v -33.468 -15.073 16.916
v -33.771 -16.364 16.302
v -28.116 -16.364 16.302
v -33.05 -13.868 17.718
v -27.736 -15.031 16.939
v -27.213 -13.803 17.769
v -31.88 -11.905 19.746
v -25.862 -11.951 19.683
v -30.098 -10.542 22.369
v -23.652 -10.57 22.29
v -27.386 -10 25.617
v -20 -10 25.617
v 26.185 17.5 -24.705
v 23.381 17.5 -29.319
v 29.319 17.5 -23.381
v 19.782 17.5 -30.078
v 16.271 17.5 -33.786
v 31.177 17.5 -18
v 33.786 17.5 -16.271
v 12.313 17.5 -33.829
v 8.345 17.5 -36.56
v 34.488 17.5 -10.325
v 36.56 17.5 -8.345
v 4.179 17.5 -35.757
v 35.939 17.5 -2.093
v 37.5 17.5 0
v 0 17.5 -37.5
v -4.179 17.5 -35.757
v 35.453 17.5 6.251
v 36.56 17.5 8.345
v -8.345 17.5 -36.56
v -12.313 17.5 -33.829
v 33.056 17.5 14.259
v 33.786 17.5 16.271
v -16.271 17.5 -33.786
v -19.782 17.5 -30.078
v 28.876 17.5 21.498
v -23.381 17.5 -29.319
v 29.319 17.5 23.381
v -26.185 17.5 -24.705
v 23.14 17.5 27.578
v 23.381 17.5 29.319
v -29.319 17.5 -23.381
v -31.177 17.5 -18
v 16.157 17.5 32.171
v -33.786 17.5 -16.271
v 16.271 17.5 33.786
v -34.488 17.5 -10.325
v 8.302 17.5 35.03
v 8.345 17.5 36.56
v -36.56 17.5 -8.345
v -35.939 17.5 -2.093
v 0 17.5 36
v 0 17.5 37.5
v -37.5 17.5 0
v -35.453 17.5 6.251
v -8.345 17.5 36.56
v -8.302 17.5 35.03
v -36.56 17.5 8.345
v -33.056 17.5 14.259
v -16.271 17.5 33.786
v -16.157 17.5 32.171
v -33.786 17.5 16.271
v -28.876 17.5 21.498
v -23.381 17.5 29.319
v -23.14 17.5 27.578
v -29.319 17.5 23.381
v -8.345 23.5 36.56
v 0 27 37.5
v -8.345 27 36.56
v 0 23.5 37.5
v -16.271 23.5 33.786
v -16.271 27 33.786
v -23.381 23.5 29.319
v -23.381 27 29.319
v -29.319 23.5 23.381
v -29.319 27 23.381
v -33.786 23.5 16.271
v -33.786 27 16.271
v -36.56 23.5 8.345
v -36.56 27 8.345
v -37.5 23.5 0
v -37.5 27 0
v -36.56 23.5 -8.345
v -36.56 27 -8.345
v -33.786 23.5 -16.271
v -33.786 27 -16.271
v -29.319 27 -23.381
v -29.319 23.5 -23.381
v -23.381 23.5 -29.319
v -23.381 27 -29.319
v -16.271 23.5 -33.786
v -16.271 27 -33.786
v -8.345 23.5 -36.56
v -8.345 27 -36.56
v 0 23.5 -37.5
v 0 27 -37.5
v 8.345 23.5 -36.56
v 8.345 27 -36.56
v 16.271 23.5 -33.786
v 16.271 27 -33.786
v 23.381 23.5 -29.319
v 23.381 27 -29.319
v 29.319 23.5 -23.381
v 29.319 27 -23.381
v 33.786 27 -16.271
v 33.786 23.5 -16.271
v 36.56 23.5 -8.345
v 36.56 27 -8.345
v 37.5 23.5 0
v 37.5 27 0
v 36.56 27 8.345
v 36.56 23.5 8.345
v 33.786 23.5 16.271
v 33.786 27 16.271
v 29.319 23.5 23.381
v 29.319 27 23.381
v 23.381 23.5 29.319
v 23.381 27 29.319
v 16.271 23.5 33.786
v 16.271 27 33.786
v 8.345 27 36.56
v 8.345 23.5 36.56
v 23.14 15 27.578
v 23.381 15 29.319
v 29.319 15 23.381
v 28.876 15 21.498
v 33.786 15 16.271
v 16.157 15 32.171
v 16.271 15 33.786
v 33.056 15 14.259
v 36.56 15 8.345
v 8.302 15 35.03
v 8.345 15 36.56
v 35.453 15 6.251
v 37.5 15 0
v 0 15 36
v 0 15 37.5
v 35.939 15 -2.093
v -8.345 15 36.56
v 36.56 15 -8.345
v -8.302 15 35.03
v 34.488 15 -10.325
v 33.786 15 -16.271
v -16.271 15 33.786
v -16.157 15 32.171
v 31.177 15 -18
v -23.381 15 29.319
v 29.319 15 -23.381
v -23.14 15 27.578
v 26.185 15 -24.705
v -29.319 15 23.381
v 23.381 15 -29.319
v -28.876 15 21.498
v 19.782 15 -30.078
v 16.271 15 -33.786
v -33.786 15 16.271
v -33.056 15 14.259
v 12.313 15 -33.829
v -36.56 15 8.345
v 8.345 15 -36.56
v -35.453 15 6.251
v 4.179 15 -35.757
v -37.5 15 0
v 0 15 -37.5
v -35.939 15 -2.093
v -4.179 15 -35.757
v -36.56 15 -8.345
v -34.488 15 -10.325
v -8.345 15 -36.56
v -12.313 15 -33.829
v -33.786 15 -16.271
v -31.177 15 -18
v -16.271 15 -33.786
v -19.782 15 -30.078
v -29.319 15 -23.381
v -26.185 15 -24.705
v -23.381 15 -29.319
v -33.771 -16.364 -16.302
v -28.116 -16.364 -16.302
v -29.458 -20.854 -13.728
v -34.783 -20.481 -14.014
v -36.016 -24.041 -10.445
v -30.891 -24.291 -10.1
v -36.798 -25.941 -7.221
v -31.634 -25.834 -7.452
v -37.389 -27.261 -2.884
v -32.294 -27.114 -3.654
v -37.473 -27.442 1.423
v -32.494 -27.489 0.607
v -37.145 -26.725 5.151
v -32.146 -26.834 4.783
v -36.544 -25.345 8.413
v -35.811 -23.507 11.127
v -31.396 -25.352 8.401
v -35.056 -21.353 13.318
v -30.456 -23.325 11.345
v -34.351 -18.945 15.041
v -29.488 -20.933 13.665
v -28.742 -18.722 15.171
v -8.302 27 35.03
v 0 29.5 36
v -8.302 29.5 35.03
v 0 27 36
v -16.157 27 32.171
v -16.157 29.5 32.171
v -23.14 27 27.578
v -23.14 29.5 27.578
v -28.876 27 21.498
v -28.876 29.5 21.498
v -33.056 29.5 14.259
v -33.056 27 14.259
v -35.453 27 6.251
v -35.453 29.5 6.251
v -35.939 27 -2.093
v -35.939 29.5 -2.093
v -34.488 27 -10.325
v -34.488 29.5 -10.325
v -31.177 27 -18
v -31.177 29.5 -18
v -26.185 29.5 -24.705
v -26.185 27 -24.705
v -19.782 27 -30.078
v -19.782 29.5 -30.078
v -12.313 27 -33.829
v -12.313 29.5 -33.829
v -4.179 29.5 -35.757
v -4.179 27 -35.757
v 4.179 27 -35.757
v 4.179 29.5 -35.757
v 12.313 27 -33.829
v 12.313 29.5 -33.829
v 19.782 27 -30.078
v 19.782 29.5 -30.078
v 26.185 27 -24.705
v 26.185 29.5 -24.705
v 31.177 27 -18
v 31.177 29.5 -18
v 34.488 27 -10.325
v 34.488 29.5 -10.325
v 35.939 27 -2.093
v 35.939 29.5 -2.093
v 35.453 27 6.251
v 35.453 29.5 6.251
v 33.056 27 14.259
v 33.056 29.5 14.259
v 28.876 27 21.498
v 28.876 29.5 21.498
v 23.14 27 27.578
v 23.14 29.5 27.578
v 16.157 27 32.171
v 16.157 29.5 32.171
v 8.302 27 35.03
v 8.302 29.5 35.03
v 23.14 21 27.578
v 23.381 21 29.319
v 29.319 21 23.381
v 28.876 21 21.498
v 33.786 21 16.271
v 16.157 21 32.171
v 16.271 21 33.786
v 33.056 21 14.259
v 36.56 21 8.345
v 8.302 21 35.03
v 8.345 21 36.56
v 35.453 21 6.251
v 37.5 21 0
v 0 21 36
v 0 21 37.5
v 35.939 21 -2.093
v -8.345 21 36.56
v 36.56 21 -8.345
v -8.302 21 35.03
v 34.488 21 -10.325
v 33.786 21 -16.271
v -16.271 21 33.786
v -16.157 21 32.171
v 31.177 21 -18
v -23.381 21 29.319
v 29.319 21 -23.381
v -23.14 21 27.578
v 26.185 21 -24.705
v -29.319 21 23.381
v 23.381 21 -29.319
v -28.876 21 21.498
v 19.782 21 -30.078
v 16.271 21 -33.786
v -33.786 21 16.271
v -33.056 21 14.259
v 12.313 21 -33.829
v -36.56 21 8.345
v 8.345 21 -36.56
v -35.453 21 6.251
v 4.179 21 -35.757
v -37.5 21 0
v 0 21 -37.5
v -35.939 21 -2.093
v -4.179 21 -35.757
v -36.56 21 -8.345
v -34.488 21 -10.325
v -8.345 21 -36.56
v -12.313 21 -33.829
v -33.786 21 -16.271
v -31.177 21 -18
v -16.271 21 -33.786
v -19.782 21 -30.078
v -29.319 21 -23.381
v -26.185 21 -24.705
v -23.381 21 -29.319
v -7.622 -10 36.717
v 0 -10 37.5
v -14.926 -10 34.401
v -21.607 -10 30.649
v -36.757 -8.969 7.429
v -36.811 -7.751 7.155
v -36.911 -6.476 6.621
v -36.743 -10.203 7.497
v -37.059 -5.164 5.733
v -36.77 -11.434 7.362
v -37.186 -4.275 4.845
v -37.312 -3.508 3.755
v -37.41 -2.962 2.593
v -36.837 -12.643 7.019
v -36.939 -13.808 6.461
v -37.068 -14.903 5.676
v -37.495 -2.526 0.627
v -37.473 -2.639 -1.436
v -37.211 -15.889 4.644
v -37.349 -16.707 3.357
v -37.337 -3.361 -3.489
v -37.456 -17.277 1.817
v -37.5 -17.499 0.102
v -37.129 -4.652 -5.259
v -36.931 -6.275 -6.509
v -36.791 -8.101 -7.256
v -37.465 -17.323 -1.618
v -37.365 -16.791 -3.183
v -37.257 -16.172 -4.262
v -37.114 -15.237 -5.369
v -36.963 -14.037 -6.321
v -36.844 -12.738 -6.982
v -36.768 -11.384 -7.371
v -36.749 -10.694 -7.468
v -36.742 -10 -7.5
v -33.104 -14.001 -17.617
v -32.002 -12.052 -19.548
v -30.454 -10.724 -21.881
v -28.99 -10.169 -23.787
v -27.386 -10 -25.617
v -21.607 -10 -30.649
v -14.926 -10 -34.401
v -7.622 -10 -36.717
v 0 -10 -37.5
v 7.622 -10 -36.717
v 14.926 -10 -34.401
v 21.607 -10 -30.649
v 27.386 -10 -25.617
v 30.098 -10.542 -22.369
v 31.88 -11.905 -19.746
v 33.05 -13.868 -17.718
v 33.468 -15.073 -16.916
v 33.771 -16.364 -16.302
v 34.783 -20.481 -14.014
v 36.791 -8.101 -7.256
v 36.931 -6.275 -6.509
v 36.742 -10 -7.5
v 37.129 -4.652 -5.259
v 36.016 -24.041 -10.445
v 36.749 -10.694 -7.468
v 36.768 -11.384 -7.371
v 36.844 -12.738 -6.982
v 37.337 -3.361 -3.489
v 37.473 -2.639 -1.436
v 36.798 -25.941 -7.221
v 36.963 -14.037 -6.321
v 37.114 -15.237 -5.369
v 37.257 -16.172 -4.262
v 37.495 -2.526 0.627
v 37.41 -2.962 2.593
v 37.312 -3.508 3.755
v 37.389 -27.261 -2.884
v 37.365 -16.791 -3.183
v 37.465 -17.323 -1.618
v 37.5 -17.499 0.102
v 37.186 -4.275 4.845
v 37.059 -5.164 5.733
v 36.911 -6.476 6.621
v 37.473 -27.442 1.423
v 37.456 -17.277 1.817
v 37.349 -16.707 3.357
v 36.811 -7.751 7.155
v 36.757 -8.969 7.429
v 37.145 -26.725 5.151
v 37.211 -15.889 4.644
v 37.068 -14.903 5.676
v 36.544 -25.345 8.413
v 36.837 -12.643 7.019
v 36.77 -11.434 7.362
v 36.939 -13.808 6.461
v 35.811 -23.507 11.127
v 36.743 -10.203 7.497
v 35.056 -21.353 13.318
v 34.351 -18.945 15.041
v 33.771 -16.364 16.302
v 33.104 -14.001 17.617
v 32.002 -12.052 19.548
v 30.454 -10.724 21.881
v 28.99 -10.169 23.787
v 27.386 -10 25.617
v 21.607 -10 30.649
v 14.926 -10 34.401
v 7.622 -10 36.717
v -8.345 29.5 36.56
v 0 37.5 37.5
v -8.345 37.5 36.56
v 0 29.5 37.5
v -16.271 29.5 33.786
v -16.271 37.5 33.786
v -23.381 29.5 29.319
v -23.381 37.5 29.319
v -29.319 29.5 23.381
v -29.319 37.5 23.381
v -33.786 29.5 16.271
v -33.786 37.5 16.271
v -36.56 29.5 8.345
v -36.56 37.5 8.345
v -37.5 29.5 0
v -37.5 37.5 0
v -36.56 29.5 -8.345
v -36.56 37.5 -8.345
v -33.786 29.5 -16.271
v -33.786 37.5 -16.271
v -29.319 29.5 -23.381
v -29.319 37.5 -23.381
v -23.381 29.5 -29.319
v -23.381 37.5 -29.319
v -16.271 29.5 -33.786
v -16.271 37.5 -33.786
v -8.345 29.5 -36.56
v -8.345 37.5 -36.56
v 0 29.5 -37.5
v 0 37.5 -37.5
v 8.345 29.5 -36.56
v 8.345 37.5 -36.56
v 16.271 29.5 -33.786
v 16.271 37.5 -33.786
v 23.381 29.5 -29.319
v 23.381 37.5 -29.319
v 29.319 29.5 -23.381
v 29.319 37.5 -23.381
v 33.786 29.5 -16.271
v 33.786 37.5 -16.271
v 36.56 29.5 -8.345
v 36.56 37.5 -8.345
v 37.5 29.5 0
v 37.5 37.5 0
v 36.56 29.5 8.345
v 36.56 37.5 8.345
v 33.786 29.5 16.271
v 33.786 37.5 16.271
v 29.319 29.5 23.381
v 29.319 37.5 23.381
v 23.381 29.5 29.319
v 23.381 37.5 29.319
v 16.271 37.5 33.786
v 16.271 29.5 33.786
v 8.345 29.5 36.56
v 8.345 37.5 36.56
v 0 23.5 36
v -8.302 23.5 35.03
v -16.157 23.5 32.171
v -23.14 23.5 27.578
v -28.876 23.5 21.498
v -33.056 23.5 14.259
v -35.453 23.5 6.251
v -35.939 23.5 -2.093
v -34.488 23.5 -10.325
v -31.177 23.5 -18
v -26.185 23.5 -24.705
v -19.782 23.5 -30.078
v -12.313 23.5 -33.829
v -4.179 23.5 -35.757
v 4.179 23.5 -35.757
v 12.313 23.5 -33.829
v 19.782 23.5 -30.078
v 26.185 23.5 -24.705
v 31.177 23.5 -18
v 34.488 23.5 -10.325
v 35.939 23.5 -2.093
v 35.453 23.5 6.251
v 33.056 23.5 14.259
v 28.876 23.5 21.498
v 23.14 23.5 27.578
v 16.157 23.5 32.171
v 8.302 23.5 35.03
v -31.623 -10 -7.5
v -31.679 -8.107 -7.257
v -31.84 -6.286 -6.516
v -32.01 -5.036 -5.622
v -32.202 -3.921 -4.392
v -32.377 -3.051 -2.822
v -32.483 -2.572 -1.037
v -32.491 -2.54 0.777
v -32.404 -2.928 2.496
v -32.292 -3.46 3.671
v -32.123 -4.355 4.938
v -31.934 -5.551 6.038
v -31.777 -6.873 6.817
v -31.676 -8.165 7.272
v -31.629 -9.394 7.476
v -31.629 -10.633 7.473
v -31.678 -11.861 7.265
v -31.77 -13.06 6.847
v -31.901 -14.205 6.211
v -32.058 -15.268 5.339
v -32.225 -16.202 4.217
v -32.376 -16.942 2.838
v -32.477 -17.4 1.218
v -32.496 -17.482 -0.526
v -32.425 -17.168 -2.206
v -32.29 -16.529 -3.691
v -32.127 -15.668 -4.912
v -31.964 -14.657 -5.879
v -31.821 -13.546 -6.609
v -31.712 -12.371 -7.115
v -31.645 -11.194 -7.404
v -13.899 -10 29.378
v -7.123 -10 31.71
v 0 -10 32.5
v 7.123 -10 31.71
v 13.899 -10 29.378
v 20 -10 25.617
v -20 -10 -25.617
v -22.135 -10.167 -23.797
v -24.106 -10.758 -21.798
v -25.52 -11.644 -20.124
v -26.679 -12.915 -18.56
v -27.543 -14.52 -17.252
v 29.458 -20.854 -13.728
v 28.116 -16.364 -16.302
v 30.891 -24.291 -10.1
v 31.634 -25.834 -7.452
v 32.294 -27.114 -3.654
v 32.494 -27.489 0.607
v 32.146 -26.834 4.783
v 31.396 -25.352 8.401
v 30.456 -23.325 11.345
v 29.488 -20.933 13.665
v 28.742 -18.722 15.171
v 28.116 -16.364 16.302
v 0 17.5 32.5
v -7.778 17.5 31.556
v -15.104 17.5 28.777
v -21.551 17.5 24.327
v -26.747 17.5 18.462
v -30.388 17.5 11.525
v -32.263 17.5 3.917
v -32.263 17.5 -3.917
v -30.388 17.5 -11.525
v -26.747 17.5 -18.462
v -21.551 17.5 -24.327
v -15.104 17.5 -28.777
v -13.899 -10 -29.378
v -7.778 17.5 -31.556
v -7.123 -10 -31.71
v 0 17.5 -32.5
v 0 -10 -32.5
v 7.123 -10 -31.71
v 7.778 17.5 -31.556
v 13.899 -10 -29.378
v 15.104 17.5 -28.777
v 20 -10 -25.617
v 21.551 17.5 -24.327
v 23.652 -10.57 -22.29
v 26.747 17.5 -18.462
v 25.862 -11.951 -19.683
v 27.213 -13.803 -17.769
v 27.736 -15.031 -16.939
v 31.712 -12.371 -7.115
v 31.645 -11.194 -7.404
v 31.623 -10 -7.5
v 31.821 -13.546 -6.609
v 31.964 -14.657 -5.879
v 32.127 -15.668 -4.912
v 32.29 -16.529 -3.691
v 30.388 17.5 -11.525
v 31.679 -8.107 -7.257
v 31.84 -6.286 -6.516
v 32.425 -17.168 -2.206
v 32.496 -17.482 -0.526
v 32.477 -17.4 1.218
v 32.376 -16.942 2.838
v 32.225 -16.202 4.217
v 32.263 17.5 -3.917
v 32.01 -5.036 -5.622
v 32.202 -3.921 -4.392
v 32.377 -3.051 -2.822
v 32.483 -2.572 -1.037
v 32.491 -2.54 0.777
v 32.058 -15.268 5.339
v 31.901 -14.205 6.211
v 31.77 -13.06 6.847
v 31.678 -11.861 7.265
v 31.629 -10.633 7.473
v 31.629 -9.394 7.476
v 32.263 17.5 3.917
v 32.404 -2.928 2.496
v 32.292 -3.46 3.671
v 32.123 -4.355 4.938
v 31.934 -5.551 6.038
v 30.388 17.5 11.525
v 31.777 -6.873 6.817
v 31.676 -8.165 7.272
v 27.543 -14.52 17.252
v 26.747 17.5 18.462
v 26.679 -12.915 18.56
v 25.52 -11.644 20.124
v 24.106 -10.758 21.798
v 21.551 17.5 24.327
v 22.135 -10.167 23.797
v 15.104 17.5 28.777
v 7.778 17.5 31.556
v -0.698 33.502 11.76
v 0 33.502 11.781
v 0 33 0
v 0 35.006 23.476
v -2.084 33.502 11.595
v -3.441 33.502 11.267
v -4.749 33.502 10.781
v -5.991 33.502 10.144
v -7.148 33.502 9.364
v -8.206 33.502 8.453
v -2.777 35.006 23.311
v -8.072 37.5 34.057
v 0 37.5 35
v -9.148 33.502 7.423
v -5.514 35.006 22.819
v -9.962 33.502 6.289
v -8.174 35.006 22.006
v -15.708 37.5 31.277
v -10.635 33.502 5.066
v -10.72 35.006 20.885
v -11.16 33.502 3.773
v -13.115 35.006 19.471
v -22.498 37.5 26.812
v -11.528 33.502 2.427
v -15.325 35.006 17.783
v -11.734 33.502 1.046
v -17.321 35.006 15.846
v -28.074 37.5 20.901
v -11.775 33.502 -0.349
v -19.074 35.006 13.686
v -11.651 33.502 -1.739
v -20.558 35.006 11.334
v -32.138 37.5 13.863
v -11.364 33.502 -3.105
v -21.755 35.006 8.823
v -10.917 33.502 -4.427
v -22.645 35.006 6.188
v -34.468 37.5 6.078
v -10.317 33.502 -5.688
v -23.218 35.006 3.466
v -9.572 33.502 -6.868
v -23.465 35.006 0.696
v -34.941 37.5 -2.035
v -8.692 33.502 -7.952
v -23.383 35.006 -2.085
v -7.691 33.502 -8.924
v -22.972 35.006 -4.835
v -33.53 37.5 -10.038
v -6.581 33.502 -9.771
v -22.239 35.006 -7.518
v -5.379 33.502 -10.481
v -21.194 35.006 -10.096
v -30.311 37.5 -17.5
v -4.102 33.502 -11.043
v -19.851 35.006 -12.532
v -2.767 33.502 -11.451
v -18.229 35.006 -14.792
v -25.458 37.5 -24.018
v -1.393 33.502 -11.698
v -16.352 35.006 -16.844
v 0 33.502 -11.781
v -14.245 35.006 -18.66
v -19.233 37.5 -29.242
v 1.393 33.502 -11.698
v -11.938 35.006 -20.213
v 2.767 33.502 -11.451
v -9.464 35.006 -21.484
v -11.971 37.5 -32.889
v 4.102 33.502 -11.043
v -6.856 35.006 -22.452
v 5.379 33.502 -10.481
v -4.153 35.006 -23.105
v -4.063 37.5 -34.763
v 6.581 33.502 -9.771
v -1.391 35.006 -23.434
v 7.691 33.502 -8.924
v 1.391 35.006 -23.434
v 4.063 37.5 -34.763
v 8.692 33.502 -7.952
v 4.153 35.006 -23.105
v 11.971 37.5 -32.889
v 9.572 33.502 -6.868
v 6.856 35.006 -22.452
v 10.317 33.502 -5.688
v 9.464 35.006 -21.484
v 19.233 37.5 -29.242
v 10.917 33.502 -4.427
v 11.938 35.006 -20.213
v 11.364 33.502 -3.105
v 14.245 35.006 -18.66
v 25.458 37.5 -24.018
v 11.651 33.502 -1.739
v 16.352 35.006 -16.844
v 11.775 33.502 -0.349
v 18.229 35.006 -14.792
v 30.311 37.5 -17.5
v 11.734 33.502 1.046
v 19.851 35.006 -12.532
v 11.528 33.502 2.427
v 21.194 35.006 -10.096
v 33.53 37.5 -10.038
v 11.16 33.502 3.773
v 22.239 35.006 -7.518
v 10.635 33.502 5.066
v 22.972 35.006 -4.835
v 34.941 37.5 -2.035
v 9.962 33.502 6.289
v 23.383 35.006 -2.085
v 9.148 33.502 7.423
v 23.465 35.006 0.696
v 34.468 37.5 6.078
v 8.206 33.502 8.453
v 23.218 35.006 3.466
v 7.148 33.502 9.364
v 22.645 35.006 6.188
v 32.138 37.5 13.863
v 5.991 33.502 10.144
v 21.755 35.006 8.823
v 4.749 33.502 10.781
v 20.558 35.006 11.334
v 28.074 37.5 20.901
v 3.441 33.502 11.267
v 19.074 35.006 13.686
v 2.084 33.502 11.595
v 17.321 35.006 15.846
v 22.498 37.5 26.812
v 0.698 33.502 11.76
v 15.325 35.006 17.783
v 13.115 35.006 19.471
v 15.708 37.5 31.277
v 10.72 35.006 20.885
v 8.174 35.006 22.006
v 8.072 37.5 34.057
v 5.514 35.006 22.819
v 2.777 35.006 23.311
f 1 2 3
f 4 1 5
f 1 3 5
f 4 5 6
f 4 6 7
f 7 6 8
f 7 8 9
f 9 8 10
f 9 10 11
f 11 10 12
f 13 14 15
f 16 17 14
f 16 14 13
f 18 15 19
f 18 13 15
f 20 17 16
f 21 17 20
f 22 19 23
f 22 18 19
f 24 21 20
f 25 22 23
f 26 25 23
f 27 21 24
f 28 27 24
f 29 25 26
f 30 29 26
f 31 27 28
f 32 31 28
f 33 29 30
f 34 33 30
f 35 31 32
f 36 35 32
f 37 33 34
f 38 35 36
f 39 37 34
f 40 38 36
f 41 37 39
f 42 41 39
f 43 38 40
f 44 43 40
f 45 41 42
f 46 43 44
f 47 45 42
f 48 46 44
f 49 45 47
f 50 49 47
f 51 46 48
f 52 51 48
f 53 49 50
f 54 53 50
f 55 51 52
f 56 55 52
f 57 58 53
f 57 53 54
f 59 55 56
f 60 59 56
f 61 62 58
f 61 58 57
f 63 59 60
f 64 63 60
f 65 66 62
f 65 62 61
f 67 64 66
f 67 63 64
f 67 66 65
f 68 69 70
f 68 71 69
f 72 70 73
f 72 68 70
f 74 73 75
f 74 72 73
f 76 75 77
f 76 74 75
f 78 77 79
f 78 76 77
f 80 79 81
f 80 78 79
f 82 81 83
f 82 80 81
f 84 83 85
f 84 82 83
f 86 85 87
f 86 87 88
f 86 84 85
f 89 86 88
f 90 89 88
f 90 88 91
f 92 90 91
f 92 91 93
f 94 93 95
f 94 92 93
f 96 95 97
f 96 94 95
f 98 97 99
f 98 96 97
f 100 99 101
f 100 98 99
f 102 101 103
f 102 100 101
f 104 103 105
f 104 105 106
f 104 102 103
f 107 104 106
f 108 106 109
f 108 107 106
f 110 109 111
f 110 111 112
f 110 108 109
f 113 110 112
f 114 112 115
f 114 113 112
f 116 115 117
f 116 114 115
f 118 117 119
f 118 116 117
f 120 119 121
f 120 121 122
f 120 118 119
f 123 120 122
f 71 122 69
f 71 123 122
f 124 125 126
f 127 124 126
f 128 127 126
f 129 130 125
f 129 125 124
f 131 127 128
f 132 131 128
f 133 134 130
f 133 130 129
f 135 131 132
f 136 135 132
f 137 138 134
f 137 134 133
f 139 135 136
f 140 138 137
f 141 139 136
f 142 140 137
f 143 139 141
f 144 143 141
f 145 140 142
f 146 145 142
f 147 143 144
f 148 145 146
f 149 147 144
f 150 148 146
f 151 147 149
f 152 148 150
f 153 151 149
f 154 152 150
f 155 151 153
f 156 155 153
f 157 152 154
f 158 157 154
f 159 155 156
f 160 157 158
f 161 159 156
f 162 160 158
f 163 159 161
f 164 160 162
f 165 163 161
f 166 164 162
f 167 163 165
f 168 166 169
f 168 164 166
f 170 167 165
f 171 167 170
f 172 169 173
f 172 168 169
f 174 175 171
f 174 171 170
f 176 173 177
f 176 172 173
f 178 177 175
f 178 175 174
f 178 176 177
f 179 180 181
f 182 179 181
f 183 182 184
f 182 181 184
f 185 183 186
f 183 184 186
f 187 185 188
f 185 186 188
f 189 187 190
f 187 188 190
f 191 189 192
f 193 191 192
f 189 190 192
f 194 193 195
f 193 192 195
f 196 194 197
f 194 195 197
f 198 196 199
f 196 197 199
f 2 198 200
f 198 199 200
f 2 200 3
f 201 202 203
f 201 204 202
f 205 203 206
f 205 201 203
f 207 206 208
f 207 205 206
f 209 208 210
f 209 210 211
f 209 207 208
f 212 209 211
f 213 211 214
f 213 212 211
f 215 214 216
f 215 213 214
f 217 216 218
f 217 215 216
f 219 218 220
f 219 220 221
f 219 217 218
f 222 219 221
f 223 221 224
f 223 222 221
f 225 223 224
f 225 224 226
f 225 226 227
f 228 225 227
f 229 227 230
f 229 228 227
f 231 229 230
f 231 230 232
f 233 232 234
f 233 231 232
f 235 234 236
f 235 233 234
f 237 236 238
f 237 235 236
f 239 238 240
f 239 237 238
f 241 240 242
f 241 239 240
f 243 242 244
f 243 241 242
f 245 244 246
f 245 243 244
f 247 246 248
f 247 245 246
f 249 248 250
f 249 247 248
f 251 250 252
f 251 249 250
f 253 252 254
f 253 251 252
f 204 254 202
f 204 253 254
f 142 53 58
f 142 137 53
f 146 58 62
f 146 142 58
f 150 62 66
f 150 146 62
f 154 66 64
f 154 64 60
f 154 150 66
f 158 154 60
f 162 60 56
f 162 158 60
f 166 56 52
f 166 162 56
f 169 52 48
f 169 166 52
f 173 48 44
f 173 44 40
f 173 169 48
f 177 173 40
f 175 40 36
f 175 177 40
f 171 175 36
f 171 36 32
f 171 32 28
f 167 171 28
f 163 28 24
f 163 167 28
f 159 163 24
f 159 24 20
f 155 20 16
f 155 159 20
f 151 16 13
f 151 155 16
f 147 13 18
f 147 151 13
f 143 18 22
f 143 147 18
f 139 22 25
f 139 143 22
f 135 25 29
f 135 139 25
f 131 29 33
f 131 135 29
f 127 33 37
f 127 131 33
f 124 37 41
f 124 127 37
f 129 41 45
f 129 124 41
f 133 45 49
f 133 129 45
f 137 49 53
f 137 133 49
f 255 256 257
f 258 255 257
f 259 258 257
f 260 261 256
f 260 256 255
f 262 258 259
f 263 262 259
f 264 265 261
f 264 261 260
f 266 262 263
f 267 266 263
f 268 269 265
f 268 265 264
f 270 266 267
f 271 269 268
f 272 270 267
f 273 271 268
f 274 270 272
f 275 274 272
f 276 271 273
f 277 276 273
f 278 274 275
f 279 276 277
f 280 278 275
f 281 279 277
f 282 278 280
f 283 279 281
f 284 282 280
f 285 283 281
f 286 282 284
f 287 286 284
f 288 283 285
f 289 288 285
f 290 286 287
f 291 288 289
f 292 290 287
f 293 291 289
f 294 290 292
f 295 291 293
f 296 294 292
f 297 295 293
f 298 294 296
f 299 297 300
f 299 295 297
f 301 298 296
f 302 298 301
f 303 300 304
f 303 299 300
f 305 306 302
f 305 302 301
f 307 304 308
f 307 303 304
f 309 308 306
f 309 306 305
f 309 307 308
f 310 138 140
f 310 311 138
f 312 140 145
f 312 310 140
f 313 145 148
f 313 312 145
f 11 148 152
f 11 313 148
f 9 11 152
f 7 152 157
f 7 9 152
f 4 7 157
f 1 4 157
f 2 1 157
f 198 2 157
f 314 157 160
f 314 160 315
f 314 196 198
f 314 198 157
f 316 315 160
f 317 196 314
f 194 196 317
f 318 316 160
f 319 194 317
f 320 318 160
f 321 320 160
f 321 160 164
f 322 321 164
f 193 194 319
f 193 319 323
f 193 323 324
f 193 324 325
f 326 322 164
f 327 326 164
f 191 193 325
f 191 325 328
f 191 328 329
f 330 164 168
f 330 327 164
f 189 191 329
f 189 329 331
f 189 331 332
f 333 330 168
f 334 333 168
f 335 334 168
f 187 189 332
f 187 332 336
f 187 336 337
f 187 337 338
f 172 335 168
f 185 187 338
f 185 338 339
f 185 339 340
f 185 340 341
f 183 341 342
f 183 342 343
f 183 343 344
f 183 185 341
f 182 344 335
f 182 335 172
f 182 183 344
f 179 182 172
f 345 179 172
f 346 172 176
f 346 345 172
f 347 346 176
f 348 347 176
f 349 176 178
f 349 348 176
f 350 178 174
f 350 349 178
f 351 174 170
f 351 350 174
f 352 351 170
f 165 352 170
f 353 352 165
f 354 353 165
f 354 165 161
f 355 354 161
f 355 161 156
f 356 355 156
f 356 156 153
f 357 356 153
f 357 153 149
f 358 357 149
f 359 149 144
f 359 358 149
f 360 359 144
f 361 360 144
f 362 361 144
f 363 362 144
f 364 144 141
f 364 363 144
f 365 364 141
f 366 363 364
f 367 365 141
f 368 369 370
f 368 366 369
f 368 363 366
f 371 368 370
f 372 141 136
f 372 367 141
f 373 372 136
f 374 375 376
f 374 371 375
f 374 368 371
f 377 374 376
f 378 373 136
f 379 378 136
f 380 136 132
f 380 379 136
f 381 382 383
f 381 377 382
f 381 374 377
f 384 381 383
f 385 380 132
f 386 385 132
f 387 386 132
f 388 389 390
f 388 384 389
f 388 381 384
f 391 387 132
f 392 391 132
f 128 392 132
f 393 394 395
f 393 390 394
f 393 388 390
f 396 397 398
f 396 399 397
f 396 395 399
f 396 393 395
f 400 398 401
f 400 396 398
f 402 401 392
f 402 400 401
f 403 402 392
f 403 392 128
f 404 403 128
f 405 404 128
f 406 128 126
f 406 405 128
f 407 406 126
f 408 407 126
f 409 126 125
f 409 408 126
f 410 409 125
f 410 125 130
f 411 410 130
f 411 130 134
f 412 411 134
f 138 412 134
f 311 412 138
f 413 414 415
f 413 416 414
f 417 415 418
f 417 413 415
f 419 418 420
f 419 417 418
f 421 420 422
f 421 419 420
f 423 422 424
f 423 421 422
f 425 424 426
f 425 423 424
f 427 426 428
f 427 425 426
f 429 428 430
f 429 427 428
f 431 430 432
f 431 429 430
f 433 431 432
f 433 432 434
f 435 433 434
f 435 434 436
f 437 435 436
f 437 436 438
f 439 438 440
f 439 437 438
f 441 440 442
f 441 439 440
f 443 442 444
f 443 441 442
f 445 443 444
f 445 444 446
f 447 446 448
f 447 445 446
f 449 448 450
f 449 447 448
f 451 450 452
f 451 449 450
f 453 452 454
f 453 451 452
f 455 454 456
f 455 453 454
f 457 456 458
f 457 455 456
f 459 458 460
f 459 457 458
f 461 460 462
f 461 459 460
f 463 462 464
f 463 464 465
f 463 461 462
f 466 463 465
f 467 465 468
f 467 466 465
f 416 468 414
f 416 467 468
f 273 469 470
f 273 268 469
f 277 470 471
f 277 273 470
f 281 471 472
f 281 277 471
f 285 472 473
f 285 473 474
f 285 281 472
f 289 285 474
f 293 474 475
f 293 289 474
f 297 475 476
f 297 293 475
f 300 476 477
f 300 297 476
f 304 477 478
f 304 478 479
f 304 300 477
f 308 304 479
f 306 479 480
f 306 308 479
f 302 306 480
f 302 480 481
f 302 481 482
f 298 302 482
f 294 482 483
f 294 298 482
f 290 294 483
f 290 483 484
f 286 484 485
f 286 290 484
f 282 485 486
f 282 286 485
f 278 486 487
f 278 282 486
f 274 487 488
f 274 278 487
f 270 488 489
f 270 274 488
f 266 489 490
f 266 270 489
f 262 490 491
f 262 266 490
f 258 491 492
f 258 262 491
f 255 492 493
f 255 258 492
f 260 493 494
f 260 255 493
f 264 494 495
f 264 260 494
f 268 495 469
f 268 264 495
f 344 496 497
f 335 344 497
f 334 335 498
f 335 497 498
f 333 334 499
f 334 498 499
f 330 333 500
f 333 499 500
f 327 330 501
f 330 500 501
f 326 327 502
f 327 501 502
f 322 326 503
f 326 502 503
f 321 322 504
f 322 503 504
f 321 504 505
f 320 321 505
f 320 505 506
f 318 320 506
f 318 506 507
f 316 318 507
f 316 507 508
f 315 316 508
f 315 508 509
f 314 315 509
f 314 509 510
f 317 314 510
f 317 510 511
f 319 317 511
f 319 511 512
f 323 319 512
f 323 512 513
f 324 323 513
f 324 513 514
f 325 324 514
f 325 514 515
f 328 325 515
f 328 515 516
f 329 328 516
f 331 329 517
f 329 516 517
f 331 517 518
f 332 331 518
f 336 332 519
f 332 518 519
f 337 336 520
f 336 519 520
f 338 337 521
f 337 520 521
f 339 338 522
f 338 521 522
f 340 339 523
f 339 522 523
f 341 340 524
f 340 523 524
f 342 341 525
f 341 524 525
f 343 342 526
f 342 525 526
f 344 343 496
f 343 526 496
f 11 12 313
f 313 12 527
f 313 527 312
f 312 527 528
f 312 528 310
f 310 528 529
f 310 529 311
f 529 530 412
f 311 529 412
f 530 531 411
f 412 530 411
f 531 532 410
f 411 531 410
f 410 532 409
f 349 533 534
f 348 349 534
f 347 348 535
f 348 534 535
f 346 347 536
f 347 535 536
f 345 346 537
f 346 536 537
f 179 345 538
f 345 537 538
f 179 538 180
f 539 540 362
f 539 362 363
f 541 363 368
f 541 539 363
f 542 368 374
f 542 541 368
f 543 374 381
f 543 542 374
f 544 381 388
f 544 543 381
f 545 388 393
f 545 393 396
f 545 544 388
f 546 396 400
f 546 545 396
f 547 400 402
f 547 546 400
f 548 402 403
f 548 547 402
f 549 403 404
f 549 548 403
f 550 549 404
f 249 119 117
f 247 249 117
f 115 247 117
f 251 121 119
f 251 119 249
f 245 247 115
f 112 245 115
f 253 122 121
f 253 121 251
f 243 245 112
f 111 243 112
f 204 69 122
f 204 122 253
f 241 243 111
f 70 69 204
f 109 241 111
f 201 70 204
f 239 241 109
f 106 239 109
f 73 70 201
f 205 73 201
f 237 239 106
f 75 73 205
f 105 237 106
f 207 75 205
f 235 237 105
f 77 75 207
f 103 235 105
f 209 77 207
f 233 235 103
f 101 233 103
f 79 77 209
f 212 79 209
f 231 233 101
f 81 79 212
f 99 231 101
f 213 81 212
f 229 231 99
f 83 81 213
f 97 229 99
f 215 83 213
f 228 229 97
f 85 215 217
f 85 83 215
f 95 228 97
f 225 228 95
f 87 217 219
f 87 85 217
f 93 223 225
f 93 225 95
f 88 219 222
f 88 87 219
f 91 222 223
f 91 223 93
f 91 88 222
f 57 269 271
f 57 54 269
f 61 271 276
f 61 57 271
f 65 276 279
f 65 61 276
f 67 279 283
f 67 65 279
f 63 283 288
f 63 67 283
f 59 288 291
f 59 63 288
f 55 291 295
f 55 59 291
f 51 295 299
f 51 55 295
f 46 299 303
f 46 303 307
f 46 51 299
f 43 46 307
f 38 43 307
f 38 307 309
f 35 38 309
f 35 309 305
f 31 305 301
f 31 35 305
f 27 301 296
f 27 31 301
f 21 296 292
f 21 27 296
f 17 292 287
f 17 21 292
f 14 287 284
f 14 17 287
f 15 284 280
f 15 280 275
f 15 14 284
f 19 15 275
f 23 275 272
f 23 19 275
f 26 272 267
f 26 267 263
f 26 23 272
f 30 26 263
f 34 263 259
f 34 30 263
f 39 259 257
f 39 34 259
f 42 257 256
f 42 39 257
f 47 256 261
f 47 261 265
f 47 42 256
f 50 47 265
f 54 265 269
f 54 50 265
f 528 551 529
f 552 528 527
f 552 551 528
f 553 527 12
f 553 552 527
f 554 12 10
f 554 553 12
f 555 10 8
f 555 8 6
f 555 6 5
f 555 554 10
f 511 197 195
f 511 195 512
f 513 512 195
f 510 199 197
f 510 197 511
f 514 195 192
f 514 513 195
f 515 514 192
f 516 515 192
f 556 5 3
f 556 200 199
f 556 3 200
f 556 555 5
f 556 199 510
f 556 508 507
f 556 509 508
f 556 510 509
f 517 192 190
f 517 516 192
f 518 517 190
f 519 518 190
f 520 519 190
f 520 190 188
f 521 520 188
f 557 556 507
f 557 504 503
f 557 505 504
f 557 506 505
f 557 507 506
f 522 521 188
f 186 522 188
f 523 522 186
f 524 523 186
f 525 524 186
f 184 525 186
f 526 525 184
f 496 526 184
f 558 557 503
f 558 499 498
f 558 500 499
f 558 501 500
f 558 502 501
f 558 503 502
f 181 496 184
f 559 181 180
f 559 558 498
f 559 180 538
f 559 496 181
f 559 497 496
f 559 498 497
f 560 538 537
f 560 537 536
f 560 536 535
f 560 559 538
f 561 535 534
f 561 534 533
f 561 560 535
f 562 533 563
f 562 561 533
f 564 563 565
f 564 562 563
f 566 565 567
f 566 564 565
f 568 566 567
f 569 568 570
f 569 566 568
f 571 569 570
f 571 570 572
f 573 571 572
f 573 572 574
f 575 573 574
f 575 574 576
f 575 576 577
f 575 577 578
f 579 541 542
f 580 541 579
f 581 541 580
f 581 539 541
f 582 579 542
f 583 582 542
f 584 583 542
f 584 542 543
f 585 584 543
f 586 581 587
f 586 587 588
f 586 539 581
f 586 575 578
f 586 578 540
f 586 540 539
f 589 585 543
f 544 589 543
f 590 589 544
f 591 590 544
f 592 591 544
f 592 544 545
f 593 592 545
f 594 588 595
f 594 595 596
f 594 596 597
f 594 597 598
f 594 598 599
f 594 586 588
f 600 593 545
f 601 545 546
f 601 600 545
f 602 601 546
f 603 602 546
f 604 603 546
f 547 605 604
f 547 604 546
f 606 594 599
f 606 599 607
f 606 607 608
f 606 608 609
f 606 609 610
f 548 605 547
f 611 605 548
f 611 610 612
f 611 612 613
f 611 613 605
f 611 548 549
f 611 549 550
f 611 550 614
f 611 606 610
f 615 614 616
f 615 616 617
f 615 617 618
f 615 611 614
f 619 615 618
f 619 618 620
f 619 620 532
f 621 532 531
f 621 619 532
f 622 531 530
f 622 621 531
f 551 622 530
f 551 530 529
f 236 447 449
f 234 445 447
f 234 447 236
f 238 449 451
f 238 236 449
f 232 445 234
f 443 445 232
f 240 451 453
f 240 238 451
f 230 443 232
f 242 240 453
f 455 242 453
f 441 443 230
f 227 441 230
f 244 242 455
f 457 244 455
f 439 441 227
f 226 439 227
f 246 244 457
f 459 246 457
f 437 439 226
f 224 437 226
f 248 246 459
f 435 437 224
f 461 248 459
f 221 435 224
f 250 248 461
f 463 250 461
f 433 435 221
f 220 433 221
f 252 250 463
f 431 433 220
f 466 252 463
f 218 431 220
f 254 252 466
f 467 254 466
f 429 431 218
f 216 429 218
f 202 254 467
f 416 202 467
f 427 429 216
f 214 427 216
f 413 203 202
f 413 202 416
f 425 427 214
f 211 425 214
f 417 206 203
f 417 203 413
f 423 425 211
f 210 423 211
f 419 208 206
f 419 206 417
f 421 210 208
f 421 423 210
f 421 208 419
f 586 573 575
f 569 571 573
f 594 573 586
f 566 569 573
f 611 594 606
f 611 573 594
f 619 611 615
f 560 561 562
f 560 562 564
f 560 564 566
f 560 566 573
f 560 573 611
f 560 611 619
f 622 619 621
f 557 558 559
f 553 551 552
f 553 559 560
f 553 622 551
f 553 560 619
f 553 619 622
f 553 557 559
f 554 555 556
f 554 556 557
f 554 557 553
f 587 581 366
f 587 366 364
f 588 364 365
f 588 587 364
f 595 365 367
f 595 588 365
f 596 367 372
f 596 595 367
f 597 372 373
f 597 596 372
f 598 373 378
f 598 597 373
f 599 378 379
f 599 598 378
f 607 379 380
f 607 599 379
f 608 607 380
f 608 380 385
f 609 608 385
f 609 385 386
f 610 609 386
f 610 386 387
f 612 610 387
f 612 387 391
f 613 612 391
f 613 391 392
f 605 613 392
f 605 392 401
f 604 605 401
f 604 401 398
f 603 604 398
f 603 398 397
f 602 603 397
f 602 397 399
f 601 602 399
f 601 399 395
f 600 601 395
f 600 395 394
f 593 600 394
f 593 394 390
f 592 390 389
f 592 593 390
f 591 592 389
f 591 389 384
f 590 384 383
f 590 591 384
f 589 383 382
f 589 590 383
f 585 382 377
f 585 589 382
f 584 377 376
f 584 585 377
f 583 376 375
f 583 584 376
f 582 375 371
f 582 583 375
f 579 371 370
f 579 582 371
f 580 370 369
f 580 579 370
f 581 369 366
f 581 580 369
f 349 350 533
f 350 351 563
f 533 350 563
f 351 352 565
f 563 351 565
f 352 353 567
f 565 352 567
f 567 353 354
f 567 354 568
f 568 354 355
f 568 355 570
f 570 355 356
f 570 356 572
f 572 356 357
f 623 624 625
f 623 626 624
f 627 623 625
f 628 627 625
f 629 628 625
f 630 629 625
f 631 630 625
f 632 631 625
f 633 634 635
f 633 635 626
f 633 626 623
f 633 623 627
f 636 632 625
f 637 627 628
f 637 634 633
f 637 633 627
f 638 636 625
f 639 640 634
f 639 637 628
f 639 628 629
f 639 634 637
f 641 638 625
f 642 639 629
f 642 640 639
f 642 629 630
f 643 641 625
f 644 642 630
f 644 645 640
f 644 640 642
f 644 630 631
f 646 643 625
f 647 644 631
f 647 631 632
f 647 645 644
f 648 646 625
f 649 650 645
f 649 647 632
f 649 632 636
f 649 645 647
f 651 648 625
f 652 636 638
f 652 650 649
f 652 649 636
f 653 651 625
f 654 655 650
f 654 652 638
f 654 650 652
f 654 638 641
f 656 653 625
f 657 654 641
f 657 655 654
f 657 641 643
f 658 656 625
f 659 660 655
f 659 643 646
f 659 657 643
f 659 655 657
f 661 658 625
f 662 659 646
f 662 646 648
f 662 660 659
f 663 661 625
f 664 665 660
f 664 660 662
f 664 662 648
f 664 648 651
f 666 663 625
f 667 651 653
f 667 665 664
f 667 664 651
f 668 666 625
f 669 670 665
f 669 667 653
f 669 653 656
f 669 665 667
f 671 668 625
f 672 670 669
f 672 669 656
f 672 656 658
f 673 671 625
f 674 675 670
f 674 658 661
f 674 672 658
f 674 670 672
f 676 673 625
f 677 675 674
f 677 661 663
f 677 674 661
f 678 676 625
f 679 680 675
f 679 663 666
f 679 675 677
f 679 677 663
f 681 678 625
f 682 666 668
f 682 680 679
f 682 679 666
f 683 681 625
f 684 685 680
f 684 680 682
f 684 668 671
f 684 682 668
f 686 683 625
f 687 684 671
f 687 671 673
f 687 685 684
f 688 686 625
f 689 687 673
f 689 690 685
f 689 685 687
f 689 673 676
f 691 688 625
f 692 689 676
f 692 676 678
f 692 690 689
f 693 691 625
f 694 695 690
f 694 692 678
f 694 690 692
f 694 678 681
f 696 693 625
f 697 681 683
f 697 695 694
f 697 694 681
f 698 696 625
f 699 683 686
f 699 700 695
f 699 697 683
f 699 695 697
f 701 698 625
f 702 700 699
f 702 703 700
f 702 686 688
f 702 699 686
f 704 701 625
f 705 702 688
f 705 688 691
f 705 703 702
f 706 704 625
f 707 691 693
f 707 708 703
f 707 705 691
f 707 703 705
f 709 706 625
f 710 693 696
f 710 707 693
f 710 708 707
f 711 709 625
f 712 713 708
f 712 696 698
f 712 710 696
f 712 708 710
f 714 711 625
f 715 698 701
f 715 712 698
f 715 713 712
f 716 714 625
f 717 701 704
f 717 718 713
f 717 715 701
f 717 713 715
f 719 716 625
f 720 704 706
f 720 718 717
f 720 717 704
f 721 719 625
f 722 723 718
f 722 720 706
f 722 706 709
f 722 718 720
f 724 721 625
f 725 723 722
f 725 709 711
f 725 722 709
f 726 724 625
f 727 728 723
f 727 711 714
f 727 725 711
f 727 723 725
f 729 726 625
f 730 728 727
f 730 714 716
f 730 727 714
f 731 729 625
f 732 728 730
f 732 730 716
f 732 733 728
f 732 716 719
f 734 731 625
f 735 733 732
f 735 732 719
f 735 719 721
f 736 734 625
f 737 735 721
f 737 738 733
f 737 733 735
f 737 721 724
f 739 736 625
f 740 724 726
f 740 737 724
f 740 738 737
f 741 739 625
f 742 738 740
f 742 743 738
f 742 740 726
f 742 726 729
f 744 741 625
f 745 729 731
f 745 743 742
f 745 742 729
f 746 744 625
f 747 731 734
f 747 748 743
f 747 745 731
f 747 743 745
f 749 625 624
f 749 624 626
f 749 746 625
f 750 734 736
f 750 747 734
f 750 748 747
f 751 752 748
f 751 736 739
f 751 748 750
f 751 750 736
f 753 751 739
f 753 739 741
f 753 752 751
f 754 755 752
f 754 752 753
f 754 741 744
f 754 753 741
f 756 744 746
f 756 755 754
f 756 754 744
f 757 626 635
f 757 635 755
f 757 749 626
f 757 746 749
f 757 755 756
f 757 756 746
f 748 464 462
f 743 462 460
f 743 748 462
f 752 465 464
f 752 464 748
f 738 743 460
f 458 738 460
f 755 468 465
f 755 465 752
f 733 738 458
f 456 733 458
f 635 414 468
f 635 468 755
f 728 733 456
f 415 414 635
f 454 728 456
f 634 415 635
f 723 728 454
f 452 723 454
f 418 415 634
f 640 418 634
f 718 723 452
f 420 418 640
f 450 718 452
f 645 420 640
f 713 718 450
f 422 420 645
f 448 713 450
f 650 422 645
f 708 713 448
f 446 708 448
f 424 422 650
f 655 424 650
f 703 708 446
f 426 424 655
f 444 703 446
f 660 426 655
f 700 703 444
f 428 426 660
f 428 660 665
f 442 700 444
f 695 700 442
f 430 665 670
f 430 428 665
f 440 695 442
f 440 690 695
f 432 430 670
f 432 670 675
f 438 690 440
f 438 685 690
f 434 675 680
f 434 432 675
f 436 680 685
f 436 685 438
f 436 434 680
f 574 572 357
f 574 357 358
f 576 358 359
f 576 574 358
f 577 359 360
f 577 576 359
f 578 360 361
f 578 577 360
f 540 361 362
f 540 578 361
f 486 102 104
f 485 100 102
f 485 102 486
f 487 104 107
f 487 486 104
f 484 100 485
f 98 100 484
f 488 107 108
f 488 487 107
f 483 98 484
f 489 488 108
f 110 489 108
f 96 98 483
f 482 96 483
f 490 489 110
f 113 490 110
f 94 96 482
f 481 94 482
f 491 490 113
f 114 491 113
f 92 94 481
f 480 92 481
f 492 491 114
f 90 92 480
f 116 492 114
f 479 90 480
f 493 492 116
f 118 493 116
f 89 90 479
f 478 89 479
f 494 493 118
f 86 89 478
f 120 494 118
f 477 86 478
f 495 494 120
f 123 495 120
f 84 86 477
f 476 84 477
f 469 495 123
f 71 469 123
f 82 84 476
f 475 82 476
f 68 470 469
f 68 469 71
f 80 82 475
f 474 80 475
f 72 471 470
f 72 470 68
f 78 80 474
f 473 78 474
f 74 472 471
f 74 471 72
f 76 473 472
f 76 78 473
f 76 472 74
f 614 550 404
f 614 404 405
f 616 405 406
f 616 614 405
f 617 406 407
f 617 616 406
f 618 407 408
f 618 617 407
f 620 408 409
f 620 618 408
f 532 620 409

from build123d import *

# Parameters (mm, degrees)
SKETCH2_R               = 7.5
CUT_EXTRUDE1_DEPTH      = 38.5
CUT_EXTRUDE1_DEPTH_BACK = 38.5
CUT_EXTRUDE2_DEPTH      = 38.500000101
CUT_EXTRUDE2_DEPTH_BACK = 38.500000101


with BuildPart() as part:
    # Sketch1 one side → Revolve1 (revolve)
    with BuildSketch(Plane(origin=(0, 0, 0), x_dir=(0, 0, -1), z_dir=(1, 0, 0))):
        with BuildLine():
            Line((-37.5, 15), (-37.5, -37.5))
            Line((-37.5, -37.5), (-32.5, -37.5))
            Line((-32.5, -37.5), (-32.5, 17.5))
            Line((-32.5, 17.5), (0, 17.5))
            Line((0, 17.5), (0, 33))
            ThreePointArc((0, 33), (-17.644049989, 34.1296112), (-35, 37.5))
            Line((-35, 37.5), (-37.5, 37.5))
            Line((-37.5, 37.5), (-37.5, 29.5))
            Line((-37.5, 29.5), (-36, 29.5))
            Line((-36, 29.5), (-36, 27))
            Line((-36, 27), (-37.5, 27))
            Line((-37.5, 27), (-37.5, 23.5))
            Line((-37.5, 23.5), (-36, 23.5))
            Line((-36, 23.5), (-36, 21))
            Line((-36, 21), (-37.5, 21))
            Line((-37.5, 21), (-37.5, 17.5))
            Line((-37.5, 17.5), (-36, 17.5))
            Line((-36, 17.5), (-36, 15))
            Line((-36, 15), (-37.5, 15))
        make_face()
    revolve(axis=Axis((0, 37.5, 0), (0, -1, 0)))

    # Sketch2 → Cut-Extrude1 (cut, two sides)
    with BuildSketch(Plane(origin=(0, 0, 0), x_dir=(0, 0, -1), z_dir=(1, 0, 0))) as cut_extrude1_sk:
        with Locations((0, -10)):
            Circle(SKETCH2_R)
    extrude(amount=CUT_EXTRUDE1_DEPTH, mode=Mode.SUBTRACT)
    extrude(cut_extrude1_sk.sketch, amount=-CUT_EXTRUDE1_DEPTH_BACK, mode=Mode.SUBTRACT)

    # Sketch3 → Cut-Extrude2 (cut, two sides)
    with BuildSketch(Plane(origin=(0, 0, 0), x_dir=(0, 0, -1), z_dir=(1, 0, 0))) as cut_extrude2_sk:
        with BuildLine():
            Line((55.2014237, -46.459477436), (54.298595824, -10))
            Line((54.298595824, -10), (25.617376915, -10))
            ThreePointArc((25.617376915, -10), (19.976616167, -11.742771762), (16.301967128, -16.363636364))
            ThreePointArc((16.301967128, -16.363636364), (0, -27.5), (-16.301967128, -16.363636364))
            ThreePointArc((-16.301967128, -16.363636364), (-19.976616167, -11.742771762), (-25.617376915, -10))
            Line((-25.617376915, -10), (-54.298595824, -10))
            Line((-54.298595824, -10), (-43.079650209, -45.071046523))
            Line((-43.079650209, -45.071046523), (55.2014237, -46.459477436))
        make_face()
    extrude(amount=CUT_EXTRUDE2_DEPTH, mode=Mode.SUBTRACT)
    extrude(cut_extrude2_sk.sketch, amount=-CUT_EXTRUDE2_DEPTH_BACK, mode=Mode.SUBTRACT)


solid = part.part
